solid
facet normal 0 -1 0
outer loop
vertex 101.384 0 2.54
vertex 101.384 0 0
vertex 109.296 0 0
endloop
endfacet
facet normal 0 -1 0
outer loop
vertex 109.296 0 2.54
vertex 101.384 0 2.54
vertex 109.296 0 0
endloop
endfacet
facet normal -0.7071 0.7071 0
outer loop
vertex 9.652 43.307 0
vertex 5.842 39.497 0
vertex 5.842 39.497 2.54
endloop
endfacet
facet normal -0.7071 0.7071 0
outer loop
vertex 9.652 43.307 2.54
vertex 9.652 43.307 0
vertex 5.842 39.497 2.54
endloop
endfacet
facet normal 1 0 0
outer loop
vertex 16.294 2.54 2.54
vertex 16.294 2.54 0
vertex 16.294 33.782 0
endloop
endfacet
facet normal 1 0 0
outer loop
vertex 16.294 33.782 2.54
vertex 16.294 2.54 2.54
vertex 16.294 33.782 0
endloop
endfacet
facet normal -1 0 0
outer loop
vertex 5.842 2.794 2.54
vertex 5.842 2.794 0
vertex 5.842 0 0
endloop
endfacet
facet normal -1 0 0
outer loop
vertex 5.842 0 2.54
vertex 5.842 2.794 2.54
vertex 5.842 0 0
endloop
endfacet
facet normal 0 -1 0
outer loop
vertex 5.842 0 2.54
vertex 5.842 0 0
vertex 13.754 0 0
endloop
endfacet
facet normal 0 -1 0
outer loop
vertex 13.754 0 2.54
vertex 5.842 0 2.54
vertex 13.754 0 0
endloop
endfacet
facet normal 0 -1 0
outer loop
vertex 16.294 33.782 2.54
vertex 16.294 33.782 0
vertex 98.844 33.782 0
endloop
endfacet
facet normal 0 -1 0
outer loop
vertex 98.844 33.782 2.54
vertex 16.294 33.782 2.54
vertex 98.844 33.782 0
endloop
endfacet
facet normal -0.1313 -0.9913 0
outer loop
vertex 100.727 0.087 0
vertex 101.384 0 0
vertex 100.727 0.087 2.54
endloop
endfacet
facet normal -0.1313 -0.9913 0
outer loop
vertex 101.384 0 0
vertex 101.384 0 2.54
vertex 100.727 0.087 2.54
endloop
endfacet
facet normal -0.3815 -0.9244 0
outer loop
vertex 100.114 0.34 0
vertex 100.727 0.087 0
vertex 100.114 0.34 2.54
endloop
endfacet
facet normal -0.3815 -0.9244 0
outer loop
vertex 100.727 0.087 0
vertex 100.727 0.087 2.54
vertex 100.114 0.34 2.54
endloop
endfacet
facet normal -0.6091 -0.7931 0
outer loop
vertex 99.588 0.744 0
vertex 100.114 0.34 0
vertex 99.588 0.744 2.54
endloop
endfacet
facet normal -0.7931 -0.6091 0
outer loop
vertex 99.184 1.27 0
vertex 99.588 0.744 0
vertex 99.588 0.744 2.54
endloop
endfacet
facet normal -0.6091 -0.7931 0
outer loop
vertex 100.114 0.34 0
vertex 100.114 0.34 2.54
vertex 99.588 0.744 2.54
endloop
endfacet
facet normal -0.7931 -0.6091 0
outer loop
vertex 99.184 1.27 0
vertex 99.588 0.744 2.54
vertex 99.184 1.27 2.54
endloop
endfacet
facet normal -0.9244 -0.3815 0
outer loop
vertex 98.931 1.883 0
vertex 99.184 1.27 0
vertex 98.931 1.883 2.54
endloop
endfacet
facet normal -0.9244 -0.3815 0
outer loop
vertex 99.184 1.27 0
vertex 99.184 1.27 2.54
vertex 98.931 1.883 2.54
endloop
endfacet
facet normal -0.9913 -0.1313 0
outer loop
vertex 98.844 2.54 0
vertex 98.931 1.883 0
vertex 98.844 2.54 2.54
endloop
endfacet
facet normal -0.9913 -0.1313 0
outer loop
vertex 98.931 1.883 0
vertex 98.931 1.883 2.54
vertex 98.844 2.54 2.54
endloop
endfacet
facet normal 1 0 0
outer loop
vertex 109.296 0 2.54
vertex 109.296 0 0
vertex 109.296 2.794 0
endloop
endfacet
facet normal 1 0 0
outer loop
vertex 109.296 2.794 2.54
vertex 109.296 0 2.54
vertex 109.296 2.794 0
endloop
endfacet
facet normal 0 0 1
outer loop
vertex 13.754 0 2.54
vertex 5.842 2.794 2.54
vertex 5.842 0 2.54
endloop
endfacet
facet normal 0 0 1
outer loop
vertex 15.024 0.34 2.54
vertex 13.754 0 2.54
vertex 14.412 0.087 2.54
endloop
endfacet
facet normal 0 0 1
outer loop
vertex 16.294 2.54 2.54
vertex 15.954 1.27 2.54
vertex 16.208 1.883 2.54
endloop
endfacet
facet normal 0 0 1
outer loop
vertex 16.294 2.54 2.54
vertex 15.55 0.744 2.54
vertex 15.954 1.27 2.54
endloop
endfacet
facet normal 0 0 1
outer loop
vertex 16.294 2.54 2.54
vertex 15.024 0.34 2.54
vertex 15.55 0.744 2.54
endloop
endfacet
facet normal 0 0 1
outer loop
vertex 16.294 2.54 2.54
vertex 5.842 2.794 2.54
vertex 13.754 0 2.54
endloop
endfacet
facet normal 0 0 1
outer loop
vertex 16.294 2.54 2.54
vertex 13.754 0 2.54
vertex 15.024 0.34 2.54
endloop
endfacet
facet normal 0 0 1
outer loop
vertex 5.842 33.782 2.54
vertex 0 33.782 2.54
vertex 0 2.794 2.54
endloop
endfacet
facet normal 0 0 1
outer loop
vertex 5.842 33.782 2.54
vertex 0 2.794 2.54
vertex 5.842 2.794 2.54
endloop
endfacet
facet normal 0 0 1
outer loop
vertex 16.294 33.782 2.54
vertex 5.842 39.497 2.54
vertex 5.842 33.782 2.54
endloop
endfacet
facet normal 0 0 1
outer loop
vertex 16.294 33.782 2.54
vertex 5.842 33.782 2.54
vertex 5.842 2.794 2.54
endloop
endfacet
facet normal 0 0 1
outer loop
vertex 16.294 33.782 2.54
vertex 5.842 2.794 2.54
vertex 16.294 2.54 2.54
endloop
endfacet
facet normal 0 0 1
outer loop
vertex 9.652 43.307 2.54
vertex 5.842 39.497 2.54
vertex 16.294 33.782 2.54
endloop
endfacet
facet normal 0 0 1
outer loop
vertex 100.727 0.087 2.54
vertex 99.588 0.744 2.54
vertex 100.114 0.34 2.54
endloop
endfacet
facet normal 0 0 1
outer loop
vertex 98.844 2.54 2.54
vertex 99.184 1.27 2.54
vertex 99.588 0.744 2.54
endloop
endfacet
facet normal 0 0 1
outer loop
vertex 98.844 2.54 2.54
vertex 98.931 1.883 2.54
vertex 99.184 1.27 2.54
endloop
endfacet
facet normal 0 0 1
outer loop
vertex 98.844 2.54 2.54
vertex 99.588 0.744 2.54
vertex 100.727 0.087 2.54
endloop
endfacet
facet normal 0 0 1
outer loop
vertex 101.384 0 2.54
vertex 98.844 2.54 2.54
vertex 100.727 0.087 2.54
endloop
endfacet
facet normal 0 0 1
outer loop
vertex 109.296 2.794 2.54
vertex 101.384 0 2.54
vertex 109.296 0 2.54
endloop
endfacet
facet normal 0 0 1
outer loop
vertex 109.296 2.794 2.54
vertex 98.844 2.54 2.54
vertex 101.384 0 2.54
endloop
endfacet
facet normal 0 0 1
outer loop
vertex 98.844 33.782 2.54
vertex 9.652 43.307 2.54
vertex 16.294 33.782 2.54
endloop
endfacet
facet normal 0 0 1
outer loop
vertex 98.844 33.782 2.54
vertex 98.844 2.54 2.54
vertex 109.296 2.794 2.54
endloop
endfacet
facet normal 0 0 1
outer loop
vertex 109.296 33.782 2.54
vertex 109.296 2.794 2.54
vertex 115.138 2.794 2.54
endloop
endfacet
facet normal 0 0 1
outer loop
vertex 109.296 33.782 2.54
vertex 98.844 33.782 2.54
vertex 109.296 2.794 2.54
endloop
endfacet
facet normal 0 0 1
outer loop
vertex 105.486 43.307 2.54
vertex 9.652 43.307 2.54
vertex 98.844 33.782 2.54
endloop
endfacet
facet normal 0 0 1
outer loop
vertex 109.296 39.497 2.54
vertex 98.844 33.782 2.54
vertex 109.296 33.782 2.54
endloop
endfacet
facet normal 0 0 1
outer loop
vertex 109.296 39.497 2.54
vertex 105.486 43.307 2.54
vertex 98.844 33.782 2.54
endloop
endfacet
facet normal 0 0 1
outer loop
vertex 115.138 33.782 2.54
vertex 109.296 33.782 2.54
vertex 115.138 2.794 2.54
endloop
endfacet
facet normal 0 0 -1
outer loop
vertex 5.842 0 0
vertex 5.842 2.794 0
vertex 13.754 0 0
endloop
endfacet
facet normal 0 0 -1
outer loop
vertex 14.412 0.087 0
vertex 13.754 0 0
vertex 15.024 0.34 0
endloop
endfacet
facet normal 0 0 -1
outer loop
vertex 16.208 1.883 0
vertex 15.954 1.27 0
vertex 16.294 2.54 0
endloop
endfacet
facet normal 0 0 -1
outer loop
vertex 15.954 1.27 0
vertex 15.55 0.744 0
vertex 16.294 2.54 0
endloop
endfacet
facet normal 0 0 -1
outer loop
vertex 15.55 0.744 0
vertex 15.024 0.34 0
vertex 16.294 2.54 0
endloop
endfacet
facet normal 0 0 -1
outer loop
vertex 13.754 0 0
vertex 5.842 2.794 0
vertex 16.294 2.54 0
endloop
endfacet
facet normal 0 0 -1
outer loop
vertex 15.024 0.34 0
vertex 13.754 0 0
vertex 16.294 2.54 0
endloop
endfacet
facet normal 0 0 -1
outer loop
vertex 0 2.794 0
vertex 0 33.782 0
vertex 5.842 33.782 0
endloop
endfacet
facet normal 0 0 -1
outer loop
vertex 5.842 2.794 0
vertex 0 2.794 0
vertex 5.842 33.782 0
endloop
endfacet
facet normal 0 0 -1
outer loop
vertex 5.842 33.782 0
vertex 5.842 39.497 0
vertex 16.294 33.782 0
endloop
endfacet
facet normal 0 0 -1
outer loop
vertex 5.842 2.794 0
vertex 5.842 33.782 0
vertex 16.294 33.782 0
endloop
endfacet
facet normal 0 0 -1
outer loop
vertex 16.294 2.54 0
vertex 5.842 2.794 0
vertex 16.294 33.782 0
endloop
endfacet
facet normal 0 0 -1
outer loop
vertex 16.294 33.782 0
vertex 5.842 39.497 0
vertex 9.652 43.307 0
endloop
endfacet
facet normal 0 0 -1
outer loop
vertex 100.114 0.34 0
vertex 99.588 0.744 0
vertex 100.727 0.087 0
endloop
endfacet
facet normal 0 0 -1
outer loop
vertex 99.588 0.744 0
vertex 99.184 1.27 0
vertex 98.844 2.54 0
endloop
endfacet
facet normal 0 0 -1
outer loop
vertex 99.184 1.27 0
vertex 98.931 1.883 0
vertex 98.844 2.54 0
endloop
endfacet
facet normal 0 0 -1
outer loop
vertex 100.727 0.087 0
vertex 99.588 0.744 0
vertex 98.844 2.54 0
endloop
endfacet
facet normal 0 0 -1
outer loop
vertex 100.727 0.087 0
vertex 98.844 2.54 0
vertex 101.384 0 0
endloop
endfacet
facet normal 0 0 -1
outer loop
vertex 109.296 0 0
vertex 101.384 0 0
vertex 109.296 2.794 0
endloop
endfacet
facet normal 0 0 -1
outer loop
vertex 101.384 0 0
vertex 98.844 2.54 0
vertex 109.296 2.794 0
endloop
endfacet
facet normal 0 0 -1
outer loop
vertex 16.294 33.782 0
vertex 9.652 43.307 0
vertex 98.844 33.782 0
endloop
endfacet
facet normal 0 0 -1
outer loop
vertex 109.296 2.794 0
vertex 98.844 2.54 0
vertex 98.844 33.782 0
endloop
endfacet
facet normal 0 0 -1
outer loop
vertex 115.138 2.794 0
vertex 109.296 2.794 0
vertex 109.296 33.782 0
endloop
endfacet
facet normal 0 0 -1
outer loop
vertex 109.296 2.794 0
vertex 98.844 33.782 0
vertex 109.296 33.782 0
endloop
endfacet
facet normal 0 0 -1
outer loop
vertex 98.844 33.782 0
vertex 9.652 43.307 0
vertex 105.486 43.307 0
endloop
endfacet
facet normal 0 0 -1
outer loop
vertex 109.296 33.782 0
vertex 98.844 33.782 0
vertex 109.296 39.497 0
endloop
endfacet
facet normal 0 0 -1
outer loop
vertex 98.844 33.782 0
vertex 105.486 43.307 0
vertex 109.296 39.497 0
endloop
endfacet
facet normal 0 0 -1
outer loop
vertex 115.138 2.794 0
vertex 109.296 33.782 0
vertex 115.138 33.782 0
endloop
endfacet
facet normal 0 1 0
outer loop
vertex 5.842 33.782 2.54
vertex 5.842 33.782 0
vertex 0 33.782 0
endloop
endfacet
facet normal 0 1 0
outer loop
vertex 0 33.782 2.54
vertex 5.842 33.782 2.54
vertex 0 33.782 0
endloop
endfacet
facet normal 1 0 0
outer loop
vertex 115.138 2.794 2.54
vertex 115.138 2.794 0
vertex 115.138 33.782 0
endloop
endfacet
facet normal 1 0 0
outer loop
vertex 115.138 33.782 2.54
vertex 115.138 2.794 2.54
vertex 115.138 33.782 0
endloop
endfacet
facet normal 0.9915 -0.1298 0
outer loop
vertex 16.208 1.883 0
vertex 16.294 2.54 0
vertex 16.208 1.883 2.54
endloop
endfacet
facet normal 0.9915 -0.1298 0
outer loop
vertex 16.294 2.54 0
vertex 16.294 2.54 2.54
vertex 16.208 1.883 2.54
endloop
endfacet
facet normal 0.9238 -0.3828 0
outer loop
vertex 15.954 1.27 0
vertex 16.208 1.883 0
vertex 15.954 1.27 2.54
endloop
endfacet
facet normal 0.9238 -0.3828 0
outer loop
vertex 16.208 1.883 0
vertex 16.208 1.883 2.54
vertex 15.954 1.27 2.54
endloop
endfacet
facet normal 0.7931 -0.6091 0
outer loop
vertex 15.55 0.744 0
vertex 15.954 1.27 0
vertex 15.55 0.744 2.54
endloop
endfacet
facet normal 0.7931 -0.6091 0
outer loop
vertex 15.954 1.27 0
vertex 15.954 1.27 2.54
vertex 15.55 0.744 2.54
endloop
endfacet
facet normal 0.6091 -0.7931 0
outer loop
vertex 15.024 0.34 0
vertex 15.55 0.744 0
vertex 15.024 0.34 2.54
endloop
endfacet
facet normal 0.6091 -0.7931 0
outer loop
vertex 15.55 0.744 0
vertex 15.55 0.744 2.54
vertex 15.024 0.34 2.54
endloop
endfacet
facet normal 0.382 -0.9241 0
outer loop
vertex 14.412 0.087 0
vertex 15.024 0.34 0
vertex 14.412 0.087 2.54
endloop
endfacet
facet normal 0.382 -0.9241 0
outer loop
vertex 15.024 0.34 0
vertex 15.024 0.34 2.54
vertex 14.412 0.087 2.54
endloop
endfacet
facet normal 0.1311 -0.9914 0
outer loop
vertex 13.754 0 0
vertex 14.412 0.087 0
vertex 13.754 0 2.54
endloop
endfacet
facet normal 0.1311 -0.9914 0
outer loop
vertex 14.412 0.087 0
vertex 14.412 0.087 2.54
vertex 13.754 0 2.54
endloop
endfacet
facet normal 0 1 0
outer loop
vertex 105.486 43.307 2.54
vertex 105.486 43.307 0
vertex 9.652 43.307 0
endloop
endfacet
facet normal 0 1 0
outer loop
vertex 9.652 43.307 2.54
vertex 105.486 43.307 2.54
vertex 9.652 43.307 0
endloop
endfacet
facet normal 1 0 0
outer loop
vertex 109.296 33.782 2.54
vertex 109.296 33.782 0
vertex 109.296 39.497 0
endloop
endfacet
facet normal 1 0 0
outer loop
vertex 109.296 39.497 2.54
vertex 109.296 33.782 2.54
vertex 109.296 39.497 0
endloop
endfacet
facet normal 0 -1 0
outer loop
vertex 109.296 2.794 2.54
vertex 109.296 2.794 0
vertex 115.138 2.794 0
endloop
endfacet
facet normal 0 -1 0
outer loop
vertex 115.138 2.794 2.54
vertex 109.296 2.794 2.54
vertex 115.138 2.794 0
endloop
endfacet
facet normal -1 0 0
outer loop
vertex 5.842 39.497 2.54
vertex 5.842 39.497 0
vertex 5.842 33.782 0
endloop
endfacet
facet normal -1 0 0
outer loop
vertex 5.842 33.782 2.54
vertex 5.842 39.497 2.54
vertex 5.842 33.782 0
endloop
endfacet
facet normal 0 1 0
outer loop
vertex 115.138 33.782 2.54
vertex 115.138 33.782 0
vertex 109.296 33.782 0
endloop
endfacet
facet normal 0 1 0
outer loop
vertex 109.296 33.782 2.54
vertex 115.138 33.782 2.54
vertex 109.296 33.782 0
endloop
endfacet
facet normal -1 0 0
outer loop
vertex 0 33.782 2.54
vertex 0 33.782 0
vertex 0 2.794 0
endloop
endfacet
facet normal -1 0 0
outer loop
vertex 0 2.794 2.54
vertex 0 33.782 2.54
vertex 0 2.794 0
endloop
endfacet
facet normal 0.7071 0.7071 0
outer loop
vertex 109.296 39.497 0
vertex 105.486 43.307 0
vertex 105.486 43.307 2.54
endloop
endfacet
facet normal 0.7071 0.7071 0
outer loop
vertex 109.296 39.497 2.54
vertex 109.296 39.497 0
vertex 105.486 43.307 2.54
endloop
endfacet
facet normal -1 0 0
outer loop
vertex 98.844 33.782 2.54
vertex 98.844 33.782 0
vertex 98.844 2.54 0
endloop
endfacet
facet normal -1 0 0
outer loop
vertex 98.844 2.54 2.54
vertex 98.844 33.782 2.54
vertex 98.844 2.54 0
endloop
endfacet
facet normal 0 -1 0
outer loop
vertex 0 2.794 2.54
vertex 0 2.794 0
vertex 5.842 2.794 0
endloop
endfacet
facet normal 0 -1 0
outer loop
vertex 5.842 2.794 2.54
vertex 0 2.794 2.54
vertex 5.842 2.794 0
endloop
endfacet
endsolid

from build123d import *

# Parameters (mm, degrees)
BOSS_EXTRUDE1_DEPTH = 2.54
CHAMFER1_SIZE       = 3.81
FILLET1_R           = 2.54


with BuildPart() as part:
    # Sketch1 → Boss-Extrude1 (new body)
    with BuildSketch(Plane.XY):
        Polygon((5.842, 0), (16.2941, 0), (16.2941, 33.782), (98.8441, 33.782), (98.8441, 0), (109.2962, 0), (109.2962, 2.794), (115.1382, 2.794), (115.1382, 33.782), (109.2962, 33.782), (109.2962, 43.307), (5.842, 43.307), (5.842, 33.782), (0, 33.782), (0, 2.794), (5.842, 2.794), align=None)
    extrude(amount=BOSS_EXTRUDE1_DEPTH)

    # Chamfer1
    chamfer1_edges = [part.edges().sort_by_distance(p)[0] for p in [
        (5.842, 43.307, 1.27),
        (109.2962, 43.307, 1.27),
    ]]
    chamfer(chamfer1_edges, length=CHAMFER1_SIZE)

    # Fillet1
    fillet1_edges = [part.edges().sort_by_distance(p)[0] for p in [
        (16.2941, 0, 1.27),
        (98.8441, 0, 1.27),
    ]]
    fillet(fillet1_edges, radius=FILLET1_R)


solid = part.part
